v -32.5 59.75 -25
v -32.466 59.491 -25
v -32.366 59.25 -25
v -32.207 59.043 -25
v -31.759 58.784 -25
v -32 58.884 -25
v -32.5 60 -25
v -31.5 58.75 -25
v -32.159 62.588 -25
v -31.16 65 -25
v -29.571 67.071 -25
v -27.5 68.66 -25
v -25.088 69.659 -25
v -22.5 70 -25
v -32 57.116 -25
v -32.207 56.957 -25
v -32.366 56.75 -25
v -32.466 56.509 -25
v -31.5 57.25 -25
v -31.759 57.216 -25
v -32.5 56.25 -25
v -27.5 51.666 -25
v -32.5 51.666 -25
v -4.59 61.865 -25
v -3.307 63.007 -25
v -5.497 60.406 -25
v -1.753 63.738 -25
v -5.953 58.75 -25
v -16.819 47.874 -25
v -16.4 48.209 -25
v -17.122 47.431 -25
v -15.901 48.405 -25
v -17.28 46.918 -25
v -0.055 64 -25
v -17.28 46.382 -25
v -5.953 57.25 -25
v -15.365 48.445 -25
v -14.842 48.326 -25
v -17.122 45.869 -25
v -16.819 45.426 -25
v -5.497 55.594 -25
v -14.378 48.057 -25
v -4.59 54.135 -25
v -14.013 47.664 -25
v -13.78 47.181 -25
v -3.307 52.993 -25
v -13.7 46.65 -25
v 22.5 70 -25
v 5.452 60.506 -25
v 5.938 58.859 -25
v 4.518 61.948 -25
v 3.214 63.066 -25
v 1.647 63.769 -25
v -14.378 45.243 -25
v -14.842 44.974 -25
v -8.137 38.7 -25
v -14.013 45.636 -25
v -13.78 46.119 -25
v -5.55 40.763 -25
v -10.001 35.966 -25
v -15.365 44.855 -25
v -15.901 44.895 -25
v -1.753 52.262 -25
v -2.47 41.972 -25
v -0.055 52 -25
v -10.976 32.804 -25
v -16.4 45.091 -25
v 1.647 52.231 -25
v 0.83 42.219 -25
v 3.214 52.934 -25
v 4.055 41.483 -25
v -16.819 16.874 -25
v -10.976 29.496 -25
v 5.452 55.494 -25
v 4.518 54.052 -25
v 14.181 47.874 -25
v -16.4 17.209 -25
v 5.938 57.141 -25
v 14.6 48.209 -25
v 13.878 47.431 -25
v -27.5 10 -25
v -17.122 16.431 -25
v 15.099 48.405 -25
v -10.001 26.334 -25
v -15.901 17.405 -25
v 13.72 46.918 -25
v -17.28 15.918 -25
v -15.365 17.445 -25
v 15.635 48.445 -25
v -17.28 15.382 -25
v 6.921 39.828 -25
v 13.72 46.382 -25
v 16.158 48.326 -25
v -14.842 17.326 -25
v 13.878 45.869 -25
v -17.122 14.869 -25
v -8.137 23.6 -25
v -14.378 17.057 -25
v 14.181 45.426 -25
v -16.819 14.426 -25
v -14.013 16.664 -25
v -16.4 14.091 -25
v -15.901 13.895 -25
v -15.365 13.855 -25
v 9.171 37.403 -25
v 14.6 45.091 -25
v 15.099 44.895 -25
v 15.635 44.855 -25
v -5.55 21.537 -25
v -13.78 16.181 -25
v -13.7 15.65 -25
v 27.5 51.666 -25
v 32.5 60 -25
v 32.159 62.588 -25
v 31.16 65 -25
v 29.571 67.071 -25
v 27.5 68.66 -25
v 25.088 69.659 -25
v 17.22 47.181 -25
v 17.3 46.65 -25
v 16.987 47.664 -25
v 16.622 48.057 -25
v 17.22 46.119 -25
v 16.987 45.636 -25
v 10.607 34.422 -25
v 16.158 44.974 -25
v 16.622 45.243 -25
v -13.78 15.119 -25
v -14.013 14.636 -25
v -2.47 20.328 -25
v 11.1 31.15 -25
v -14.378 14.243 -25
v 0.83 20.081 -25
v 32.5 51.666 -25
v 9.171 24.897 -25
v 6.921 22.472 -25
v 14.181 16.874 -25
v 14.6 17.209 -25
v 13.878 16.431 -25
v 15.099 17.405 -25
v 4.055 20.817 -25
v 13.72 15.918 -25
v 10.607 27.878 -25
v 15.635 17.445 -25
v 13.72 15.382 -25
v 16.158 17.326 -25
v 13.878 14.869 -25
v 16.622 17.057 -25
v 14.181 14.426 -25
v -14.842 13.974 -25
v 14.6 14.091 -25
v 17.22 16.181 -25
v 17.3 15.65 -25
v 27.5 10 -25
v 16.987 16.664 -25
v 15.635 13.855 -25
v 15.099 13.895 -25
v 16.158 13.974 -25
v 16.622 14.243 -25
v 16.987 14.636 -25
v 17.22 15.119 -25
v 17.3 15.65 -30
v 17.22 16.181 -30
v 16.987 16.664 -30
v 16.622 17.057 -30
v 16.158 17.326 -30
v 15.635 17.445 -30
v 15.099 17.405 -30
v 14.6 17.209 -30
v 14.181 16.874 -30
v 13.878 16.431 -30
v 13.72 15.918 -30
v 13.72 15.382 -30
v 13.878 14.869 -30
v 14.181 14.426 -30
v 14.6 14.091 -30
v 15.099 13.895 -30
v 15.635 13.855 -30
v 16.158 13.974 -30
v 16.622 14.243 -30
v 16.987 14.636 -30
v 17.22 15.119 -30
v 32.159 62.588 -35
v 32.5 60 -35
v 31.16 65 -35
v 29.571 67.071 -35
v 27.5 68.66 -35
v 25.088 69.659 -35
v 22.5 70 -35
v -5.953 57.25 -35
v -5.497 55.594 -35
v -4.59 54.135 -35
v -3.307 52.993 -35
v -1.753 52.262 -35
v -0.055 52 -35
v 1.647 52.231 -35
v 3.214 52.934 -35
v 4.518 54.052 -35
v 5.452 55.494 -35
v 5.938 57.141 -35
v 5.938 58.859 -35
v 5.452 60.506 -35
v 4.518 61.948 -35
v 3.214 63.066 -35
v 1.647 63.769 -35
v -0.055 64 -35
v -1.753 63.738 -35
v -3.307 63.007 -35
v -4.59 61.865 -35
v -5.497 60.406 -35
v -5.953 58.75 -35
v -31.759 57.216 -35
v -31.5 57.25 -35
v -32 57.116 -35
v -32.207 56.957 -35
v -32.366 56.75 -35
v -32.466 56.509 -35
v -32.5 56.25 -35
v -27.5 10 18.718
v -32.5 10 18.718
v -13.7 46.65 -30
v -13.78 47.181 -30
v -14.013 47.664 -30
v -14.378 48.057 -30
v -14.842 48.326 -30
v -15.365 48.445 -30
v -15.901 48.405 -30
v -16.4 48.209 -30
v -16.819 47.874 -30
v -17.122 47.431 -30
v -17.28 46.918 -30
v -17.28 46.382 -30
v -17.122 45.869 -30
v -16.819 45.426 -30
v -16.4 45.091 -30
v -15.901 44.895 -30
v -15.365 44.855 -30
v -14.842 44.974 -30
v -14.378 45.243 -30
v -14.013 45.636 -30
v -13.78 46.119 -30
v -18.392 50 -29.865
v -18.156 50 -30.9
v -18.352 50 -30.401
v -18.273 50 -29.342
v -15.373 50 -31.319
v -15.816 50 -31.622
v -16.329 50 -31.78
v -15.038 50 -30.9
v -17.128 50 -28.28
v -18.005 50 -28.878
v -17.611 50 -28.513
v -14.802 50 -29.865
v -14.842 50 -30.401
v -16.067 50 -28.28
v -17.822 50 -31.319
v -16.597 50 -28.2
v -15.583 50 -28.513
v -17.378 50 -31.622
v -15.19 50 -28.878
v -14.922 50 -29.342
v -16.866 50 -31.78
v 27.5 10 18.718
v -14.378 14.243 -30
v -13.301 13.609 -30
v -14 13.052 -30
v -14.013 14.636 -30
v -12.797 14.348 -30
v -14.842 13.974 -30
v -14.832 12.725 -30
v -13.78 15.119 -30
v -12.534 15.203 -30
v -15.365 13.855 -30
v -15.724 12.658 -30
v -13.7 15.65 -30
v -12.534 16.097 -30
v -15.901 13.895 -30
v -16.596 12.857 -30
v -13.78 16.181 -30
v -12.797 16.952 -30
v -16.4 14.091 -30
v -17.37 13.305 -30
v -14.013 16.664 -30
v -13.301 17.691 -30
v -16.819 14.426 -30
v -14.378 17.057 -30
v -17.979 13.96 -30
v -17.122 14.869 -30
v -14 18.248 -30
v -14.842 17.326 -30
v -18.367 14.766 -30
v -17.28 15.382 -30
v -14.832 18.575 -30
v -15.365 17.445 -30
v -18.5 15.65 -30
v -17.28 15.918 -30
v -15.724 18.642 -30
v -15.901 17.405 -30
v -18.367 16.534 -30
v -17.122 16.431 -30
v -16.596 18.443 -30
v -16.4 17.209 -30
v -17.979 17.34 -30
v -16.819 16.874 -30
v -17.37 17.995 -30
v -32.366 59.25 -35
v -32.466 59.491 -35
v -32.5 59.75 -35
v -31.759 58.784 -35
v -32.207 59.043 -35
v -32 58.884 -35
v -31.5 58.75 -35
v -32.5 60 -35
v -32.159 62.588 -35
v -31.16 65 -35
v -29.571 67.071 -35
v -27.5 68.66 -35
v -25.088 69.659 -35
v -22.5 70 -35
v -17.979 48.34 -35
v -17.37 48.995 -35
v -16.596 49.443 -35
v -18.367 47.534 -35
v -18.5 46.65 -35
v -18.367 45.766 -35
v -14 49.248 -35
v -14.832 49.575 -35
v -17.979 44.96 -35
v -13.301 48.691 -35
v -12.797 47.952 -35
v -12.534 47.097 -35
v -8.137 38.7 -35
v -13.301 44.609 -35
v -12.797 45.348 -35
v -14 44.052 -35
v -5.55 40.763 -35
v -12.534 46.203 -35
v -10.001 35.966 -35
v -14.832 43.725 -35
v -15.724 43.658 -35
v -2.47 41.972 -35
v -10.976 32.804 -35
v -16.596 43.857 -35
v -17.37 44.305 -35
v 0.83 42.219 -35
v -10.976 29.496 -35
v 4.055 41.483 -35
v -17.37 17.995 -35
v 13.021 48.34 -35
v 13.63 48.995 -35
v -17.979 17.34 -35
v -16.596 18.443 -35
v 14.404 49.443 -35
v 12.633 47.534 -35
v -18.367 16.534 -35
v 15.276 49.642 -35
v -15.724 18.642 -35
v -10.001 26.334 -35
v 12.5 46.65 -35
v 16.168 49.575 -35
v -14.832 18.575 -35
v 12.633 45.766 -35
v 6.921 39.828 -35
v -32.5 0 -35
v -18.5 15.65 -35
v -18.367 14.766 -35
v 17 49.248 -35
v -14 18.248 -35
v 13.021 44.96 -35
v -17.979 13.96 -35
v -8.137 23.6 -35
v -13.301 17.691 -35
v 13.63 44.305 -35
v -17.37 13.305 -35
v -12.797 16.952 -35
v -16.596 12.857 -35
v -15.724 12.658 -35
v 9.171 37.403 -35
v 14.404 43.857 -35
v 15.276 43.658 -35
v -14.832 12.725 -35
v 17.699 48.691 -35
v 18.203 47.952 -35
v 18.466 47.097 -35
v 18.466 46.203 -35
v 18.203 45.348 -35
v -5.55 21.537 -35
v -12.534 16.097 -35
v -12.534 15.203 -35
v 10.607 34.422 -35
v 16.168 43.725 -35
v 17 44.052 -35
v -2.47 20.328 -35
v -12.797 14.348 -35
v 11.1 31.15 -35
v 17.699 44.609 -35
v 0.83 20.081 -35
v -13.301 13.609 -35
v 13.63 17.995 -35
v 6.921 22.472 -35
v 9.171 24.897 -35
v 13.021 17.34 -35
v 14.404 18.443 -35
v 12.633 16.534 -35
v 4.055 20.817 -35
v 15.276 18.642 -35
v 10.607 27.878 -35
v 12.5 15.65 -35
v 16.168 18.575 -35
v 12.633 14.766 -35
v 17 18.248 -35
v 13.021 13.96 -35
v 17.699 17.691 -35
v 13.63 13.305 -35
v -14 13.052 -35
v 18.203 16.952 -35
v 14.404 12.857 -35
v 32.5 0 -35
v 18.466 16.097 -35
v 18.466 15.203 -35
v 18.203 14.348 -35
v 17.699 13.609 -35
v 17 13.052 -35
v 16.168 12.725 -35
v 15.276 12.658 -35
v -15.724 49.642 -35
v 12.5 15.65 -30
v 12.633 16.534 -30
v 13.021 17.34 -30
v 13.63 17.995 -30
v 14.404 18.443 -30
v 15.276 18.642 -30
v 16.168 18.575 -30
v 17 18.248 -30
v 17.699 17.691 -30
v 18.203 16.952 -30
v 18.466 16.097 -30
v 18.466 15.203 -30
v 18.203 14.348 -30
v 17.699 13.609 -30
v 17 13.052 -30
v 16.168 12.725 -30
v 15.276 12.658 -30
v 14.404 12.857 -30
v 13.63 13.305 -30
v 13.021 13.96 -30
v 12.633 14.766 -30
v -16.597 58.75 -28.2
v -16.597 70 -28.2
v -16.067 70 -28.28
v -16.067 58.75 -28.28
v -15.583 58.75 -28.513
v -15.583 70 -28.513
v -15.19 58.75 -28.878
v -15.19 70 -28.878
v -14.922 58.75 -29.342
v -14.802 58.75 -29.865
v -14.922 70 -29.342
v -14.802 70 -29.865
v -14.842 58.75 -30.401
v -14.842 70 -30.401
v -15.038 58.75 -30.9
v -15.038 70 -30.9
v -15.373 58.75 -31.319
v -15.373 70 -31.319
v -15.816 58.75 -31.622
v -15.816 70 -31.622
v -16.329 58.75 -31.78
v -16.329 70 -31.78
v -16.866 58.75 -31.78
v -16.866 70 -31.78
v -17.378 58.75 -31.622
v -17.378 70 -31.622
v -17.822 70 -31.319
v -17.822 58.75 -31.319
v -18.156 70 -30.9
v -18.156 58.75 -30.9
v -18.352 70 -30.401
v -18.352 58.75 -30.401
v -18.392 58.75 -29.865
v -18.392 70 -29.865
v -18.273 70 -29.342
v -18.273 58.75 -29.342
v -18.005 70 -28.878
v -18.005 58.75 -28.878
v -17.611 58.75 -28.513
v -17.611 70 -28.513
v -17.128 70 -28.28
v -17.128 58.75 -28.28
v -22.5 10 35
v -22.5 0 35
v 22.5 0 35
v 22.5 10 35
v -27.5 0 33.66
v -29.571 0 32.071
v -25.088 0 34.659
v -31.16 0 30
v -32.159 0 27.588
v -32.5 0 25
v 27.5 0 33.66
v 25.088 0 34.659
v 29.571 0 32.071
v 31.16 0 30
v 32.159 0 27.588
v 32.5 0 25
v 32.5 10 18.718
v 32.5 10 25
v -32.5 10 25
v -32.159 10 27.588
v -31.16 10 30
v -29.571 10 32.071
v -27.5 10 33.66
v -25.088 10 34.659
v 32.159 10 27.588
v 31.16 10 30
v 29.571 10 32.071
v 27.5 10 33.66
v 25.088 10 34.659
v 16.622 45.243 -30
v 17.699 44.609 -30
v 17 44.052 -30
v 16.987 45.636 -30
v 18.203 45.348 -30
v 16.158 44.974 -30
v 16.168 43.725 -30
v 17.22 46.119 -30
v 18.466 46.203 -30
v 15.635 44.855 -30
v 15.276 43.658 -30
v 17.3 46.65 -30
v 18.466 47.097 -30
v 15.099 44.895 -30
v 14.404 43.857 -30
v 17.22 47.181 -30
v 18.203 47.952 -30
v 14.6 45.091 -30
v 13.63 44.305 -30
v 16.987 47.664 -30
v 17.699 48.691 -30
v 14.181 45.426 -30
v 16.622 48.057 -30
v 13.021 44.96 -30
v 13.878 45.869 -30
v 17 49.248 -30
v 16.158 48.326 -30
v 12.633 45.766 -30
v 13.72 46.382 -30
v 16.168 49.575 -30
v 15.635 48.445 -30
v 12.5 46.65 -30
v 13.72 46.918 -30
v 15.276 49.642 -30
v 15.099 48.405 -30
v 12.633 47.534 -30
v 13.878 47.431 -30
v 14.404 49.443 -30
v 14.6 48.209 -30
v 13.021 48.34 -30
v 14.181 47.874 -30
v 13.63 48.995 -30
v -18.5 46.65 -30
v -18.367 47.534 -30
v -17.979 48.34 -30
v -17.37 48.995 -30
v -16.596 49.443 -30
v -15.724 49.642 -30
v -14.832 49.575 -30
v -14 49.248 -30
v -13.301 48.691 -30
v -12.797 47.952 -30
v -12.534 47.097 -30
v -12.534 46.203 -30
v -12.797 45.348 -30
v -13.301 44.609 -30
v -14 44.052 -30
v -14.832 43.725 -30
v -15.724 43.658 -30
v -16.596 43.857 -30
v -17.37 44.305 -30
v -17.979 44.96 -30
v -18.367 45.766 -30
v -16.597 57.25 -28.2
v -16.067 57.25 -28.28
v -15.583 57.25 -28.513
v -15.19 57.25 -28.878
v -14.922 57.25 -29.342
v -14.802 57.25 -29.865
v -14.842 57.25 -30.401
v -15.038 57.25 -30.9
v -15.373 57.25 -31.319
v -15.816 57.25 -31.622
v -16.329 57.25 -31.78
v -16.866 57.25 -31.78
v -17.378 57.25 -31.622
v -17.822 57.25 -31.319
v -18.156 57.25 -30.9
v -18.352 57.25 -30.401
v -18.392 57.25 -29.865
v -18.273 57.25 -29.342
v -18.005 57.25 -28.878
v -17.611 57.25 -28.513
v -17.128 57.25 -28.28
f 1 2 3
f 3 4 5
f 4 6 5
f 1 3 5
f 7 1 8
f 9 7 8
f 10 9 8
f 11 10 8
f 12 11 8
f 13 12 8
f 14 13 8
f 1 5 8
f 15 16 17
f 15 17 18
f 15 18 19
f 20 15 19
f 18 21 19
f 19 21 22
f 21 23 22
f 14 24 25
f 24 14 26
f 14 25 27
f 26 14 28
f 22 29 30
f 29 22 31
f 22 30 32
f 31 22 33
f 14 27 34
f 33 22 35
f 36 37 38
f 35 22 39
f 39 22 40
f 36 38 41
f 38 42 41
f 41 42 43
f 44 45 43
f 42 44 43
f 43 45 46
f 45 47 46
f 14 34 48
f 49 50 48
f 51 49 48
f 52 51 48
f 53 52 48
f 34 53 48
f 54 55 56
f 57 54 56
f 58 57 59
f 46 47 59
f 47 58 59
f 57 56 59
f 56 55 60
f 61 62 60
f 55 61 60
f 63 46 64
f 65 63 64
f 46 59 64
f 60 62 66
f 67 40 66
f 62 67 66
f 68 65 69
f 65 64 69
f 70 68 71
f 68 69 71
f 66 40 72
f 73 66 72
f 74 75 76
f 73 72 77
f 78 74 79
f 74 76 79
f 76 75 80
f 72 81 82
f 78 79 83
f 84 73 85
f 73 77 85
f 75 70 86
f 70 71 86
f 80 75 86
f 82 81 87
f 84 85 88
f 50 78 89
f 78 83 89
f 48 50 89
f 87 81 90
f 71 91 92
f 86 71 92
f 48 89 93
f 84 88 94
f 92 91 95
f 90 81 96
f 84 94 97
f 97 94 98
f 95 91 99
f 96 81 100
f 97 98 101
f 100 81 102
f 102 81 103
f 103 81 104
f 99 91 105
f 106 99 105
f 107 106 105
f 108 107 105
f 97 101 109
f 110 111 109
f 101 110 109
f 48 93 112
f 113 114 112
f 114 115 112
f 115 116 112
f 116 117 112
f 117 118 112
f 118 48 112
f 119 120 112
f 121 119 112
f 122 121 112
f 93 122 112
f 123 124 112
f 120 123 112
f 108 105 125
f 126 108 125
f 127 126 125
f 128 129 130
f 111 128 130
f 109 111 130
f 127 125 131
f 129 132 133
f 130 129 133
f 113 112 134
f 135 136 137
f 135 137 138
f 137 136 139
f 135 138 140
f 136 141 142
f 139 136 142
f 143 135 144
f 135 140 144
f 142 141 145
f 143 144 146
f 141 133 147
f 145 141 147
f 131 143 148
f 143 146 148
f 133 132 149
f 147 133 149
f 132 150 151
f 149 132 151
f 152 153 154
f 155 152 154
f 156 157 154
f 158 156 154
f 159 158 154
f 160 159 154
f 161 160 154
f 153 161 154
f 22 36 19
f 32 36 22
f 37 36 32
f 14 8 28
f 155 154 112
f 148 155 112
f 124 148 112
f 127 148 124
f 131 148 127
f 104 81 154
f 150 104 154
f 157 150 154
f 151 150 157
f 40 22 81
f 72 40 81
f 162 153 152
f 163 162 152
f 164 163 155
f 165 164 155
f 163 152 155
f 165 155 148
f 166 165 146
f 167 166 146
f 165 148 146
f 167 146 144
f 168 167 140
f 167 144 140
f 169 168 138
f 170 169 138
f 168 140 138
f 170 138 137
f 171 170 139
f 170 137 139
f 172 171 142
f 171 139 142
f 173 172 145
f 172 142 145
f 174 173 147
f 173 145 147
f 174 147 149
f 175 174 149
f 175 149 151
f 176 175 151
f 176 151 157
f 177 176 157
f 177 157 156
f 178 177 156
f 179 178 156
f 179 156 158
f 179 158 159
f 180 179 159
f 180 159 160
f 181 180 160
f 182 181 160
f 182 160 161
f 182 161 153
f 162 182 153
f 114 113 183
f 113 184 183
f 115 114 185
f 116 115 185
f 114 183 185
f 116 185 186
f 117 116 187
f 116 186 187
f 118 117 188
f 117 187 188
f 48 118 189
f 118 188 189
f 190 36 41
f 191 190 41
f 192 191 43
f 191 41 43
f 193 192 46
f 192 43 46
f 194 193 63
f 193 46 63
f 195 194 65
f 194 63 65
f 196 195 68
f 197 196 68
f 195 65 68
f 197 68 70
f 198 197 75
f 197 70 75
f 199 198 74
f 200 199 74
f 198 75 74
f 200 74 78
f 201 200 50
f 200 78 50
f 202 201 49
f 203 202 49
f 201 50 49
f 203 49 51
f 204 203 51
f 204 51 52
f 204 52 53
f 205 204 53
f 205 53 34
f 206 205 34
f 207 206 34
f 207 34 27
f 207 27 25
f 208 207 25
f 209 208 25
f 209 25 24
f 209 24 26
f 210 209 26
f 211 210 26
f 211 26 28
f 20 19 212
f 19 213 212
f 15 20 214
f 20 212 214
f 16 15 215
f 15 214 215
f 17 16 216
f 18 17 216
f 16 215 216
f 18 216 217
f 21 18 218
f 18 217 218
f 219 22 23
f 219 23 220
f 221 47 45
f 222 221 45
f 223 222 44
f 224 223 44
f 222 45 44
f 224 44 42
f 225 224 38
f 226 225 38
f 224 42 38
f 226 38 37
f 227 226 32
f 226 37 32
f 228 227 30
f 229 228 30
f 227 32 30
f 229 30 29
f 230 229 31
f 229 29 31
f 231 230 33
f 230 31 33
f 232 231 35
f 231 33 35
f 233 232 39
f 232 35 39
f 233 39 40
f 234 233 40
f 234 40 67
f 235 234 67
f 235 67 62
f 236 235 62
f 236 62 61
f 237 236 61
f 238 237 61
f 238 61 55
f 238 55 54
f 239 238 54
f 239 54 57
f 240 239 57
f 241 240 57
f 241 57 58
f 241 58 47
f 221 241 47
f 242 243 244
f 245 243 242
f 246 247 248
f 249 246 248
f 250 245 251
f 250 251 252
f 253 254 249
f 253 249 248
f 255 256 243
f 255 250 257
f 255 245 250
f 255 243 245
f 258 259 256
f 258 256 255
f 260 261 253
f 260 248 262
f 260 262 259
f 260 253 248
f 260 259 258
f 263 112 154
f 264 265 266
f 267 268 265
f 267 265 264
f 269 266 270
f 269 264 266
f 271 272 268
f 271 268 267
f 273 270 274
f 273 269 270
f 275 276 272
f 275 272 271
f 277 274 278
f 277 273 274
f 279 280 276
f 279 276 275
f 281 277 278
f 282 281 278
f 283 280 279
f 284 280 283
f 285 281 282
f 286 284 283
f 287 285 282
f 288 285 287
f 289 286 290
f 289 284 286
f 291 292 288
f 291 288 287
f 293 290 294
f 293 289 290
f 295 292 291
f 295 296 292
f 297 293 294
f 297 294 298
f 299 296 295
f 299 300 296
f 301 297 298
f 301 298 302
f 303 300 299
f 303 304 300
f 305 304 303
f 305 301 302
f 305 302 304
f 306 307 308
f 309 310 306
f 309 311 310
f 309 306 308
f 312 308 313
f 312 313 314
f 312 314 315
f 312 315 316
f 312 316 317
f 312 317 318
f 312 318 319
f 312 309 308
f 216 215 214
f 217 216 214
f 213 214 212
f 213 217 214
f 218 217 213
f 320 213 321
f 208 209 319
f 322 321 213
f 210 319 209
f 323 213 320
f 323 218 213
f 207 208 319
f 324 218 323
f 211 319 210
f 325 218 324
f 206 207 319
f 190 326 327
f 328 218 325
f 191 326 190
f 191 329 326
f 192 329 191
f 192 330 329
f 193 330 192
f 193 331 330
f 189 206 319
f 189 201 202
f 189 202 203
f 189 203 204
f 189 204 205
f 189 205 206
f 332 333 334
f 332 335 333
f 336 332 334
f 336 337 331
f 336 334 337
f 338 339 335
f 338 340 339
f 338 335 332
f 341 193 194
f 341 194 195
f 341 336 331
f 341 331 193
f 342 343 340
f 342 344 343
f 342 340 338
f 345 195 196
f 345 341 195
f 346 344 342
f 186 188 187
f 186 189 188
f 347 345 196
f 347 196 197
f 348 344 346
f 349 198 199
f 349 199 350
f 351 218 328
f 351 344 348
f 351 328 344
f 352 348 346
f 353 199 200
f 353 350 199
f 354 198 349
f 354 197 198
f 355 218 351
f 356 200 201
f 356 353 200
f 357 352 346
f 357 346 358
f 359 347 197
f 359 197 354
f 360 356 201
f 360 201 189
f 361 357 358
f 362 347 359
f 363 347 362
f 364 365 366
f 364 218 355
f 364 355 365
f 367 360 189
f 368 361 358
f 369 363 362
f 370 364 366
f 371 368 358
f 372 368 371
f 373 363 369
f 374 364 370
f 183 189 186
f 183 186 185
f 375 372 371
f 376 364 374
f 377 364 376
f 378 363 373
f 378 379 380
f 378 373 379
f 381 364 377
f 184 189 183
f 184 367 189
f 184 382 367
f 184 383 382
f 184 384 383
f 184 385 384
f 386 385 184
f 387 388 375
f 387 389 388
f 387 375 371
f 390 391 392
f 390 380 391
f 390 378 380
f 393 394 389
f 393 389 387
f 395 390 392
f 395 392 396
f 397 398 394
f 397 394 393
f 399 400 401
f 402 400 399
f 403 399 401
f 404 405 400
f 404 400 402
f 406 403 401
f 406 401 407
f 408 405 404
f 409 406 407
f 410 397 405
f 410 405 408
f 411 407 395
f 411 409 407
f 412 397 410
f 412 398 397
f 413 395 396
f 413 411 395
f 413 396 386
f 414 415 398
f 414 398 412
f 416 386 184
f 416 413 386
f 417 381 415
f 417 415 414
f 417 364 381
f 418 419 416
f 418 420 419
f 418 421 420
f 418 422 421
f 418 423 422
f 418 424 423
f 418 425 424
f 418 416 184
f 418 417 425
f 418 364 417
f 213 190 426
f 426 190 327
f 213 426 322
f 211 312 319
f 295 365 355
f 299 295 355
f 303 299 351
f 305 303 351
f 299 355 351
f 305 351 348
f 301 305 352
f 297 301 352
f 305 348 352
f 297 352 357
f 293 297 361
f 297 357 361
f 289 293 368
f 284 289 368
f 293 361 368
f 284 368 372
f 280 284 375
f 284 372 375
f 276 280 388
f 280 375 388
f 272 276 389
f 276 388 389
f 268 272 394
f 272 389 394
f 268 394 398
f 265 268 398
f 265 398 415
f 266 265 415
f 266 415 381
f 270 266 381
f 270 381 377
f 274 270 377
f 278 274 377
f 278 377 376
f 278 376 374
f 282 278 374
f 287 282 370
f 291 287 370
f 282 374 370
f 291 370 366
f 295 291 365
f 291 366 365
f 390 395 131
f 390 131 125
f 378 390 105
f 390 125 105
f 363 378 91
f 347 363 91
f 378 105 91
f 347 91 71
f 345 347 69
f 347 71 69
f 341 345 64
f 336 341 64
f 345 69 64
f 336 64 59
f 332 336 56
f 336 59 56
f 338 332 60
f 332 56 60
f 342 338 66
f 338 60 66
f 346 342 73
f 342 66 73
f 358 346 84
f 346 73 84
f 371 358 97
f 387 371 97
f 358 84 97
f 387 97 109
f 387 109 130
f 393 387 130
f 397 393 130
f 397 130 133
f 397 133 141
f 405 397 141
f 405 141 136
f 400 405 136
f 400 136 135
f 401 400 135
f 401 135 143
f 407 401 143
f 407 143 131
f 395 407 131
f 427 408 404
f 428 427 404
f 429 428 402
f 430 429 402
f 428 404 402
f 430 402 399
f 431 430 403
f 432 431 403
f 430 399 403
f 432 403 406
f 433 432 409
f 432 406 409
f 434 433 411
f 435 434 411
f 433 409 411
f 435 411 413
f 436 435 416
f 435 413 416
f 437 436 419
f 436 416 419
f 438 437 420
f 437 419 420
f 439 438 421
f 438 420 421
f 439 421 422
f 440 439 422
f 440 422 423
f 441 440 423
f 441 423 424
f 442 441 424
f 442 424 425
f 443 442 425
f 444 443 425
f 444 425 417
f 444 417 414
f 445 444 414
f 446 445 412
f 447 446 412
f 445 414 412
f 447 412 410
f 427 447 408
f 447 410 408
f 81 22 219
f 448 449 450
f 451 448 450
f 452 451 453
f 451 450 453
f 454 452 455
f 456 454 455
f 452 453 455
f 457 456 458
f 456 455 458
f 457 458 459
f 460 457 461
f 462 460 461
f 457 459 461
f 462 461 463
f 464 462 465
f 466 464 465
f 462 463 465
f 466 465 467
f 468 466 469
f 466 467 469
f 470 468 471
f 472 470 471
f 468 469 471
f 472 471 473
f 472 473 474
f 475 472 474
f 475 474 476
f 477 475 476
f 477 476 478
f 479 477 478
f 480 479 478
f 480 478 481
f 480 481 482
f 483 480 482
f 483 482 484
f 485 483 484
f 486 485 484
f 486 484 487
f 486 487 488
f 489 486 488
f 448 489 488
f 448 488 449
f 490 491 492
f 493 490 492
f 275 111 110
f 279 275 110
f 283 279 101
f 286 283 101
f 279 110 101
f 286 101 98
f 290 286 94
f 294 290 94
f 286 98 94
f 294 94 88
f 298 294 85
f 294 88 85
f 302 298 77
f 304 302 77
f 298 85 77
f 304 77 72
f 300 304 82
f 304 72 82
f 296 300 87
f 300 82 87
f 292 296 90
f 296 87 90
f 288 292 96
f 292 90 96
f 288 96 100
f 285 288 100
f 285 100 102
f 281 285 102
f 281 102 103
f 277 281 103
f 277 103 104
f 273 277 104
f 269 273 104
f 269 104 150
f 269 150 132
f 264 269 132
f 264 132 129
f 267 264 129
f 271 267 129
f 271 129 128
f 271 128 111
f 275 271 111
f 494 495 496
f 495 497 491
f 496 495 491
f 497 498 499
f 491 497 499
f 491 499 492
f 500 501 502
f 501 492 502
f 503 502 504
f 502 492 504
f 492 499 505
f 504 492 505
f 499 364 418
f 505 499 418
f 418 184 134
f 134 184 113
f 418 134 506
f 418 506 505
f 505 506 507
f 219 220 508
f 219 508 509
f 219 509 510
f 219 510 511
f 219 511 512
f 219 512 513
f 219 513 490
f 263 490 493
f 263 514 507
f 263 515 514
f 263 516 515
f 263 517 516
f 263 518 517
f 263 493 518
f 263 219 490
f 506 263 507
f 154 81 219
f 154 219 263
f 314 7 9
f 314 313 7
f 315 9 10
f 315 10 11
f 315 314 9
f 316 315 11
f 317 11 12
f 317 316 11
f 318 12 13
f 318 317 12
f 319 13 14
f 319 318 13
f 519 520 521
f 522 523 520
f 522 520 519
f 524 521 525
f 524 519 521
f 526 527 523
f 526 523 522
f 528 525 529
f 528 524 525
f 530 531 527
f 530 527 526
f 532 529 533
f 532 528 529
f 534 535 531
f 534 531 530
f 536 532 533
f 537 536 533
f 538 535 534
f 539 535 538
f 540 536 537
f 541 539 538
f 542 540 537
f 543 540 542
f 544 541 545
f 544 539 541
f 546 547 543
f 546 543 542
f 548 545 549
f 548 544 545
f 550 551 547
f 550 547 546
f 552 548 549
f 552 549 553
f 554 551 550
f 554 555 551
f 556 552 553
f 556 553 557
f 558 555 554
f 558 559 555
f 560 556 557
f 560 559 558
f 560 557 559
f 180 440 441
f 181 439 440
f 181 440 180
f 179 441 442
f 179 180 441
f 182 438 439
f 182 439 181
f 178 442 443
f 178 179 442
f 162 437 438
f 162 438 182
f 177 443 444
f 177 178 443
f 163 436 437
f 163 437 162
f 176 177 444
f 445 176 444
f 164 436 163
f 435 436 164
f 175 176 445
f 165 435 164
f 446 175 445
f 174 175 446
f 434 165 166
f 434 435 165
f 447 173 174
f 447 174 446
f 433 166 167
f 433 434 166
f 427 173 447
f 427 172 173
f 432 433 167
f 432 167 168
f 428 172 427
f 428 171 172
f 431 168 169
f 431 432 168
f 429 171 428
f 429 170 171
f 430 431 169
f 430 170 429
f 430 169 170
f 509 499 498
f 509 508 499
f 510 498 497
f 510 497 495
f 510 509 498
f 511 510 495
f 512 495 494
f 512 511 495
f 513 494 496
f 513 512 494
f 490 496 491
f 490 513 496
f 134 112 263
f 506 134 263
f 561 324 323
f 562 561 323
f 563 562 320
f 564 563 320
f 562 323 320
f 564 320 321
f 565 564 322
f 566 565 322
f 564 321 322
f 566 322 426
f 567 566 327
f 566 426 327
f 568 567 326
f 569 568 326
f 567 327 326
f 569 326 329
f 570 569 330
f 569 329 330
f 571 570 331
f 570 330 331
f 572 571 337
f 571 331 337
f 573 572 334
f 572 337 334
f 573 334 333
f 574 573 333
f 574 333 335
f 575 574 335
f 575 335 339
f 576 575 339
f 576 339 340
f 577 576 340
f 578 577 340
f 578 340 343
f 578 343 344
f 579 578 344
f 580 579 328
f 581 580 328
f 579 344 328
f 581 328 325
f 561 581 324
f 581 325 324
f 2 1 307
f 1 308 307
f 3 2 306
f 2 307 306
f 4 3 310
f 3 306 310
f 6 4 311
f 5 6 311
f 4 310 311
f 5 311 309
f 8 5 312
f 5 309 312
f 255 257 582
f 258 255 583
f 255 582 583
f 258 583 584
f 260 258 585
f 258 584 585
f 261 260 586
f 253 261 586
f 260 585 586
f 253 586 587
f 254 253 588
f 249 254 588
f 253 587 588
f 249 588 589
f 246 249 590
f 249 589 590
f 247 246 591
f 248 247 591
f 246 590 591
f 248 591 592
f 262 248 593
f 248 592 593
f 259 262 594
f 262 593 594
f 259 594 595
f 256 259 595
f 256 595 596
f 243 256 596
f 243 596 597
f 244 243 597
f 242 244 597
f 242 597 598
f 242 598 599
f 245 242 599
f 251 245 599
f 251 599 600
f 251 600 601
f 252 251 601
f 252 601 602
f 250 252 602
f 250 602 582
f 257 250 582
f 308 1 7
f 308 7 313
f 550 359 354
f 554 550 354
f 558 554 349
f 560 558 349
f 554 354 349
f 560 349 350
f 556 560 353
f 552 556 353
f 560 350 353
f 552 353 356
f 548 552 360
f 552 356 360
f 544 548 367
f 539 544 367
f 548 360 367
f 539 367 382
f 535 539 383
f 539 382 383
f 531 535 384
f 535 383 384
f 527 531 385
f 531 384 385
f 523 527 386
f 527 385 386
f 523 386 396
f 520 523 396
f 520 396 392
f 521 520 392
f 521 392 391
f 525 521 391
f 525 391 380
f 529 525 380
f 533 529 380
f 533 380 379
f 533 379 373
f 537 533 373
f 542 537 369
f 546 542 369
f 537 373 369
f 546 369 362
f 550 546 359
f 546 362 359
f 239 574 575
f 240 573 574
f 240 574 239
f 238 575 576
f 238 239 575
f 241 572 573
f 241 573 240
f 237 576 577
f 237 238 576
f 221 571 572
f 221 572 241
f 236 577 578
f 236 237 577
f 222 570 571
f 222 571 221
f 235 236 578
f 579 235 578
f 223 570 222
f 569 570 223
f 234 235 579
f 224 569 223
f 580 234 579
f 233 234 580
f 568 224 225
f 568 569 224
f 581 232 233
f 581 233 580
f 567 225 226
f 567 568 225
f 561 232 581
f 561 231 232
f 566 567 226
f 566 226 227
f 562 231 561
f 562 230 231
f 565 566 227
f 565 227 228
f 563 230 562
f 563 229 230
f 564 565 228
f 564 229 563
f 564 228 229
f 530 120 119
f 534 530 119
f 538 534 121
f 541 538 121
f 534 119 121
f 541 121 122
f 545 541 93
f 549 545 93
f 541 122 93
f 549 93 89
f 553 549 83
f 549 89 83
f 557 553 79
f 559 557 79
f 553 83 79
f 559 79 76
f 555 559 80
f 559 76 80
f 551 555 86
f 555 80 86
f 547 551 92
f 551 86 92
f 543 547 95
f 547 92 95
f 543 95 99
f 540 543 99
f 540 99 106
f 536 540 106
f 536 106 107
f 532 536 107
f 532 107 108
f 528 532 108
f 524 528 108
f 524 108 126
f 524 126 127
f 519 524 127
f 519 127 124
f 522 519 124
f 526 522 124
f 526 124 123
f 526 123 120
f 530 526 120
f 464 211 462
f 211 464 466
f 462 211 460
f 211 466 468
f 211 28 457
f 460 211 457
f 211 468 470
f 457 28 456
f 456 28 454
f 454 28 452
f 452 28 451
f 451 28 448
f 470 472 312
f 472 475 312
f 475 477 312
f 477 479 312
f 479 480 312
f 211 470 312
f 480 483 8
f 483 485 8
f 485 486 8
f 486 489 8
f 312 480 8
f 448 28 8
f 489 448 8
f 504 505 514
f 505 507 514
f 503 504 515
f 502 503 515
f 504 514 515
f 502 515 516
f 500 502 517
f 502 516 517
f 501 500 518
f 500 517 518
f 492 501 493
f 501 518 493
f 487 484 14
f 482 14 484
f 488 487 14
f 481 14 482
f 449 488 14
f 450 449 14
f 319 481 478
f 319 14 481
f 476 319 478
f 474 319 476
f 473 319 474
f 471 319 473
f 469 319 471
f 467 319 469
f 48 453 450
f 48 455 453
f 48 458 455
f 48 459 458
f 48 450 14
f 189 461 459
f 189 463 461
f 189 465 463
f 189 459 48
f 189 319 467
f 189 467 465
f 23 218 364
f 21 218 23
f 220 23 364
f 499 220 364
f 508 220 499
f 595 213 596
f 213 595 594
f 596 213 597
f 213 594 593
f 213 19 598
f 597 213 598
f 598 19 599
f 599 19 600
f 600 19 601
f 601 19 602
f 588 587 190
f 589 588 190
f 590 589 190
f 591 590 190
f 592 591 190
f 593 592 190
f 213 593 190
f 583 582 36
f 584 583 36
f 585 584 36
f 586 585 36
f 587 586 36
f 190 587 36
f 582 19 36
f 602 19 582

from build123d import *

# Parameters (mm, degrees)
SKETCH1_W           = 65
SKETCH1_H           = 70
BOSS_EXTRUDE1_DEPTH = 10
SKETCH2_W           = 65
SKETCH2_H           = 10
BOSS_EXTRUDE2_DEPTH = 60
FILLET1_R           = 10
CUT_EXTRUDE3_DEPTH  = 60
FILLET2_R           = 10
FILLET3_R           = 1
FILLET4_R           = 1
SKETCH4_R           = 11.1
CUT_EXTRUDE4_DEPTH  = 60
RIB1_REACH          = 103.735
SKETCH5_WALL_W      = 265.86260353
SKETCH5_WALL_H      = 5
SKETCH6_R           = 1.8
CUT_EXTRUDE5_DEPTH  = 20
SKETCH7_R           = 1.8
CUT_EXTRUDE8_DEPTH  = 10
SKETCH9_R           = 3
CUT_EXTRUDE9_DEPTH  = 5


with BuildPart() as part:
    # Sketch1 → Boss-Extrude1 (new body)
    with BuildSketch(Plane(origin=(0, 0, 0), x_dir=(1, 0, 0), z_dir=(0, 1, 0))):
        Rectangle(SKETCH1_W, SKETCH1_H)
    extrude(amount=BOSS_EXTRUDE1_DEPTH)

    # Sketch2 → Boss-Extrude2 (add)
    with BuildSketch(Plane(origin=(0, 10, 0), x_dir=(1, 0, 0), z_dir=(0, 1, 0))):
        with Locations((0, 30)):
            Rectangle(SKETCH2_W, SKETCH2_H)
    extrude(amount=BOSS_EXTRUDE2_DEPTH)

    # Fillet1
    fillet1_edges = [part.edges().sort_by_distance(p)[0] for p in [
        (-32.5, 5, 35),
        (32.5, 5, 35),
    ]]
    fillet(fillet1_edges, radius=FILLET1_R)

    # Sketch3 → Cut-Extrude3 (cut)
    with BuildSketch(Plane.XY.offset(-25)):
        with BuildLine():
            Line((-5.95294045, 58.75), (-32.5, 58.75))
            Line((-32.5, 58.75), (-32.5, 57.25))
            Line((-32.5, 57.25), (-5.95294045, 57.25))
            ThreePointArc((-5.95294045, 57.25), (6, 58), (-5.95294045, 58.75))
        make_face()
    extrude(amount=-CUT_EXTRUDE3_DEPTH, mode=Mode.SUBTRACT)

    # Fillet2
    fillet2_edges = [part.edges().sort_by_distance(p)[0] for p in [
        (-32.5, 70, -30),
        (32.5, 70, -30),
    ]]
    fillet(fillet2_edges, radius=FILLET2_R)

    # Fillet3
    fillet3_edges = [part.edges().sort_by_distance(p)[0] for p in [
        (-32.5, 58.75, -30),
    ]]
    fillet(fillet3_edges, radius=FILLET3_R)

    # Fillet4
    fillet4_edges = [part.edges().sort_by_distance(p)[0] for p in [
        (-32.5, 57.25, -30),
    ]]
    fillet(fillet4_edges, radius=FILLET4_R)

    # Sketch4 → Cut-Extrude4 (cut)
    with BuildSketch(Plane.XY.offset(-25)):
        with Locations((0, 31.15)):
            Circle(SKETCH4_R)
    extrude(amount=-CUT_EXTRUDE4_DEPTH, mode=Mode.SUBTRACT)

    # Sketch5 wall → Rib1 (add, up to next)
    with BuildSketch(Plane(origin=(-32.5, 30.832944907, -3.141178401), x_dir=(0, -0.689915950612, 0.723889481269), z_dir=(0, 0.723889481269, 0.689915950612)), mode=Mode.PRIVATE) as rib1_sk1:
        with Locations((0, 2.5)):
            Rectangle(SKETCH5_WALL_W, SKETCH5_WALL_H)
    rib1_tool1 = extrude(rib1_sk1.sketch, amount=-RIB1_REACH, mode=Mode.PRIVATE) - part.part
    rib1 = rib1_tool1.solids().sort_by_distance((-32.5, 30.832944907, -3.141178401))[0]
    add(rib1)

    # Mirror1: Rib1 across plane
    add(rib1.mirror(Plane(origin=(0, 0, 0), x_dir=(0, 0, 1), z_dir=(1, 0, 0))))

    # Sketch6 → Cut-Extrude5 (cut)
    with BuildSketch(Plane(origin=(0, 70, 0), x_dir=(1, 0, 0), z_dir=(0, 1, 0))):
        with Locations(Location((-16.597294225, 30, 0), (0, 0, 270))):
            Circle(SKETCH6_R)
    extrude(amount=-CUT_EXTRUDE5_DEPTH, mode=Mode.SUBTRACT)

    # Sketch7 → Cut-Extrude8 (cut)
    with BuildSketch(Plane.XY.offset(-25)):
        with Locations((-15.5, 46.65)):
            Circle(SKETCH7_R)
        with Locations((15.5, 46.65)):
            Circle(SKETCH7_R)
        with Locations((15.5, 15.65)):
            Circle(SKETCH7_R)
        with Locations((-15.5, 15.65)):
            Circle(SKETCH7_R)
    extrude(amount=-CUT_EXTRUDE8_DEPTH, mode=Mode.SUBTRACT)

    # Sketch9 → Cut-Extrude9 (cut)
    with BuildSketch(Plane(origin=(0, 0, -35), x_dir=(-1, 0, 0), z_dir=(0, 0, -1))):
        with Locations((-15.5, 46.65)):
            Circle(SKETCH9_R)
        with Locations((15.5, 46.65)):
            Circle(SKETCH9_R)
        with Locations((15.5, 15.65)):
            Circle(SKETCH9_R)
        with Locations((-15.5, 15.65)):
            Circle(SKETCH9_R)
    extrude(amount=-CUT_EXTRUDE9_DEPTH, mode=Mode.SUBTRACT)


solid = part.part
